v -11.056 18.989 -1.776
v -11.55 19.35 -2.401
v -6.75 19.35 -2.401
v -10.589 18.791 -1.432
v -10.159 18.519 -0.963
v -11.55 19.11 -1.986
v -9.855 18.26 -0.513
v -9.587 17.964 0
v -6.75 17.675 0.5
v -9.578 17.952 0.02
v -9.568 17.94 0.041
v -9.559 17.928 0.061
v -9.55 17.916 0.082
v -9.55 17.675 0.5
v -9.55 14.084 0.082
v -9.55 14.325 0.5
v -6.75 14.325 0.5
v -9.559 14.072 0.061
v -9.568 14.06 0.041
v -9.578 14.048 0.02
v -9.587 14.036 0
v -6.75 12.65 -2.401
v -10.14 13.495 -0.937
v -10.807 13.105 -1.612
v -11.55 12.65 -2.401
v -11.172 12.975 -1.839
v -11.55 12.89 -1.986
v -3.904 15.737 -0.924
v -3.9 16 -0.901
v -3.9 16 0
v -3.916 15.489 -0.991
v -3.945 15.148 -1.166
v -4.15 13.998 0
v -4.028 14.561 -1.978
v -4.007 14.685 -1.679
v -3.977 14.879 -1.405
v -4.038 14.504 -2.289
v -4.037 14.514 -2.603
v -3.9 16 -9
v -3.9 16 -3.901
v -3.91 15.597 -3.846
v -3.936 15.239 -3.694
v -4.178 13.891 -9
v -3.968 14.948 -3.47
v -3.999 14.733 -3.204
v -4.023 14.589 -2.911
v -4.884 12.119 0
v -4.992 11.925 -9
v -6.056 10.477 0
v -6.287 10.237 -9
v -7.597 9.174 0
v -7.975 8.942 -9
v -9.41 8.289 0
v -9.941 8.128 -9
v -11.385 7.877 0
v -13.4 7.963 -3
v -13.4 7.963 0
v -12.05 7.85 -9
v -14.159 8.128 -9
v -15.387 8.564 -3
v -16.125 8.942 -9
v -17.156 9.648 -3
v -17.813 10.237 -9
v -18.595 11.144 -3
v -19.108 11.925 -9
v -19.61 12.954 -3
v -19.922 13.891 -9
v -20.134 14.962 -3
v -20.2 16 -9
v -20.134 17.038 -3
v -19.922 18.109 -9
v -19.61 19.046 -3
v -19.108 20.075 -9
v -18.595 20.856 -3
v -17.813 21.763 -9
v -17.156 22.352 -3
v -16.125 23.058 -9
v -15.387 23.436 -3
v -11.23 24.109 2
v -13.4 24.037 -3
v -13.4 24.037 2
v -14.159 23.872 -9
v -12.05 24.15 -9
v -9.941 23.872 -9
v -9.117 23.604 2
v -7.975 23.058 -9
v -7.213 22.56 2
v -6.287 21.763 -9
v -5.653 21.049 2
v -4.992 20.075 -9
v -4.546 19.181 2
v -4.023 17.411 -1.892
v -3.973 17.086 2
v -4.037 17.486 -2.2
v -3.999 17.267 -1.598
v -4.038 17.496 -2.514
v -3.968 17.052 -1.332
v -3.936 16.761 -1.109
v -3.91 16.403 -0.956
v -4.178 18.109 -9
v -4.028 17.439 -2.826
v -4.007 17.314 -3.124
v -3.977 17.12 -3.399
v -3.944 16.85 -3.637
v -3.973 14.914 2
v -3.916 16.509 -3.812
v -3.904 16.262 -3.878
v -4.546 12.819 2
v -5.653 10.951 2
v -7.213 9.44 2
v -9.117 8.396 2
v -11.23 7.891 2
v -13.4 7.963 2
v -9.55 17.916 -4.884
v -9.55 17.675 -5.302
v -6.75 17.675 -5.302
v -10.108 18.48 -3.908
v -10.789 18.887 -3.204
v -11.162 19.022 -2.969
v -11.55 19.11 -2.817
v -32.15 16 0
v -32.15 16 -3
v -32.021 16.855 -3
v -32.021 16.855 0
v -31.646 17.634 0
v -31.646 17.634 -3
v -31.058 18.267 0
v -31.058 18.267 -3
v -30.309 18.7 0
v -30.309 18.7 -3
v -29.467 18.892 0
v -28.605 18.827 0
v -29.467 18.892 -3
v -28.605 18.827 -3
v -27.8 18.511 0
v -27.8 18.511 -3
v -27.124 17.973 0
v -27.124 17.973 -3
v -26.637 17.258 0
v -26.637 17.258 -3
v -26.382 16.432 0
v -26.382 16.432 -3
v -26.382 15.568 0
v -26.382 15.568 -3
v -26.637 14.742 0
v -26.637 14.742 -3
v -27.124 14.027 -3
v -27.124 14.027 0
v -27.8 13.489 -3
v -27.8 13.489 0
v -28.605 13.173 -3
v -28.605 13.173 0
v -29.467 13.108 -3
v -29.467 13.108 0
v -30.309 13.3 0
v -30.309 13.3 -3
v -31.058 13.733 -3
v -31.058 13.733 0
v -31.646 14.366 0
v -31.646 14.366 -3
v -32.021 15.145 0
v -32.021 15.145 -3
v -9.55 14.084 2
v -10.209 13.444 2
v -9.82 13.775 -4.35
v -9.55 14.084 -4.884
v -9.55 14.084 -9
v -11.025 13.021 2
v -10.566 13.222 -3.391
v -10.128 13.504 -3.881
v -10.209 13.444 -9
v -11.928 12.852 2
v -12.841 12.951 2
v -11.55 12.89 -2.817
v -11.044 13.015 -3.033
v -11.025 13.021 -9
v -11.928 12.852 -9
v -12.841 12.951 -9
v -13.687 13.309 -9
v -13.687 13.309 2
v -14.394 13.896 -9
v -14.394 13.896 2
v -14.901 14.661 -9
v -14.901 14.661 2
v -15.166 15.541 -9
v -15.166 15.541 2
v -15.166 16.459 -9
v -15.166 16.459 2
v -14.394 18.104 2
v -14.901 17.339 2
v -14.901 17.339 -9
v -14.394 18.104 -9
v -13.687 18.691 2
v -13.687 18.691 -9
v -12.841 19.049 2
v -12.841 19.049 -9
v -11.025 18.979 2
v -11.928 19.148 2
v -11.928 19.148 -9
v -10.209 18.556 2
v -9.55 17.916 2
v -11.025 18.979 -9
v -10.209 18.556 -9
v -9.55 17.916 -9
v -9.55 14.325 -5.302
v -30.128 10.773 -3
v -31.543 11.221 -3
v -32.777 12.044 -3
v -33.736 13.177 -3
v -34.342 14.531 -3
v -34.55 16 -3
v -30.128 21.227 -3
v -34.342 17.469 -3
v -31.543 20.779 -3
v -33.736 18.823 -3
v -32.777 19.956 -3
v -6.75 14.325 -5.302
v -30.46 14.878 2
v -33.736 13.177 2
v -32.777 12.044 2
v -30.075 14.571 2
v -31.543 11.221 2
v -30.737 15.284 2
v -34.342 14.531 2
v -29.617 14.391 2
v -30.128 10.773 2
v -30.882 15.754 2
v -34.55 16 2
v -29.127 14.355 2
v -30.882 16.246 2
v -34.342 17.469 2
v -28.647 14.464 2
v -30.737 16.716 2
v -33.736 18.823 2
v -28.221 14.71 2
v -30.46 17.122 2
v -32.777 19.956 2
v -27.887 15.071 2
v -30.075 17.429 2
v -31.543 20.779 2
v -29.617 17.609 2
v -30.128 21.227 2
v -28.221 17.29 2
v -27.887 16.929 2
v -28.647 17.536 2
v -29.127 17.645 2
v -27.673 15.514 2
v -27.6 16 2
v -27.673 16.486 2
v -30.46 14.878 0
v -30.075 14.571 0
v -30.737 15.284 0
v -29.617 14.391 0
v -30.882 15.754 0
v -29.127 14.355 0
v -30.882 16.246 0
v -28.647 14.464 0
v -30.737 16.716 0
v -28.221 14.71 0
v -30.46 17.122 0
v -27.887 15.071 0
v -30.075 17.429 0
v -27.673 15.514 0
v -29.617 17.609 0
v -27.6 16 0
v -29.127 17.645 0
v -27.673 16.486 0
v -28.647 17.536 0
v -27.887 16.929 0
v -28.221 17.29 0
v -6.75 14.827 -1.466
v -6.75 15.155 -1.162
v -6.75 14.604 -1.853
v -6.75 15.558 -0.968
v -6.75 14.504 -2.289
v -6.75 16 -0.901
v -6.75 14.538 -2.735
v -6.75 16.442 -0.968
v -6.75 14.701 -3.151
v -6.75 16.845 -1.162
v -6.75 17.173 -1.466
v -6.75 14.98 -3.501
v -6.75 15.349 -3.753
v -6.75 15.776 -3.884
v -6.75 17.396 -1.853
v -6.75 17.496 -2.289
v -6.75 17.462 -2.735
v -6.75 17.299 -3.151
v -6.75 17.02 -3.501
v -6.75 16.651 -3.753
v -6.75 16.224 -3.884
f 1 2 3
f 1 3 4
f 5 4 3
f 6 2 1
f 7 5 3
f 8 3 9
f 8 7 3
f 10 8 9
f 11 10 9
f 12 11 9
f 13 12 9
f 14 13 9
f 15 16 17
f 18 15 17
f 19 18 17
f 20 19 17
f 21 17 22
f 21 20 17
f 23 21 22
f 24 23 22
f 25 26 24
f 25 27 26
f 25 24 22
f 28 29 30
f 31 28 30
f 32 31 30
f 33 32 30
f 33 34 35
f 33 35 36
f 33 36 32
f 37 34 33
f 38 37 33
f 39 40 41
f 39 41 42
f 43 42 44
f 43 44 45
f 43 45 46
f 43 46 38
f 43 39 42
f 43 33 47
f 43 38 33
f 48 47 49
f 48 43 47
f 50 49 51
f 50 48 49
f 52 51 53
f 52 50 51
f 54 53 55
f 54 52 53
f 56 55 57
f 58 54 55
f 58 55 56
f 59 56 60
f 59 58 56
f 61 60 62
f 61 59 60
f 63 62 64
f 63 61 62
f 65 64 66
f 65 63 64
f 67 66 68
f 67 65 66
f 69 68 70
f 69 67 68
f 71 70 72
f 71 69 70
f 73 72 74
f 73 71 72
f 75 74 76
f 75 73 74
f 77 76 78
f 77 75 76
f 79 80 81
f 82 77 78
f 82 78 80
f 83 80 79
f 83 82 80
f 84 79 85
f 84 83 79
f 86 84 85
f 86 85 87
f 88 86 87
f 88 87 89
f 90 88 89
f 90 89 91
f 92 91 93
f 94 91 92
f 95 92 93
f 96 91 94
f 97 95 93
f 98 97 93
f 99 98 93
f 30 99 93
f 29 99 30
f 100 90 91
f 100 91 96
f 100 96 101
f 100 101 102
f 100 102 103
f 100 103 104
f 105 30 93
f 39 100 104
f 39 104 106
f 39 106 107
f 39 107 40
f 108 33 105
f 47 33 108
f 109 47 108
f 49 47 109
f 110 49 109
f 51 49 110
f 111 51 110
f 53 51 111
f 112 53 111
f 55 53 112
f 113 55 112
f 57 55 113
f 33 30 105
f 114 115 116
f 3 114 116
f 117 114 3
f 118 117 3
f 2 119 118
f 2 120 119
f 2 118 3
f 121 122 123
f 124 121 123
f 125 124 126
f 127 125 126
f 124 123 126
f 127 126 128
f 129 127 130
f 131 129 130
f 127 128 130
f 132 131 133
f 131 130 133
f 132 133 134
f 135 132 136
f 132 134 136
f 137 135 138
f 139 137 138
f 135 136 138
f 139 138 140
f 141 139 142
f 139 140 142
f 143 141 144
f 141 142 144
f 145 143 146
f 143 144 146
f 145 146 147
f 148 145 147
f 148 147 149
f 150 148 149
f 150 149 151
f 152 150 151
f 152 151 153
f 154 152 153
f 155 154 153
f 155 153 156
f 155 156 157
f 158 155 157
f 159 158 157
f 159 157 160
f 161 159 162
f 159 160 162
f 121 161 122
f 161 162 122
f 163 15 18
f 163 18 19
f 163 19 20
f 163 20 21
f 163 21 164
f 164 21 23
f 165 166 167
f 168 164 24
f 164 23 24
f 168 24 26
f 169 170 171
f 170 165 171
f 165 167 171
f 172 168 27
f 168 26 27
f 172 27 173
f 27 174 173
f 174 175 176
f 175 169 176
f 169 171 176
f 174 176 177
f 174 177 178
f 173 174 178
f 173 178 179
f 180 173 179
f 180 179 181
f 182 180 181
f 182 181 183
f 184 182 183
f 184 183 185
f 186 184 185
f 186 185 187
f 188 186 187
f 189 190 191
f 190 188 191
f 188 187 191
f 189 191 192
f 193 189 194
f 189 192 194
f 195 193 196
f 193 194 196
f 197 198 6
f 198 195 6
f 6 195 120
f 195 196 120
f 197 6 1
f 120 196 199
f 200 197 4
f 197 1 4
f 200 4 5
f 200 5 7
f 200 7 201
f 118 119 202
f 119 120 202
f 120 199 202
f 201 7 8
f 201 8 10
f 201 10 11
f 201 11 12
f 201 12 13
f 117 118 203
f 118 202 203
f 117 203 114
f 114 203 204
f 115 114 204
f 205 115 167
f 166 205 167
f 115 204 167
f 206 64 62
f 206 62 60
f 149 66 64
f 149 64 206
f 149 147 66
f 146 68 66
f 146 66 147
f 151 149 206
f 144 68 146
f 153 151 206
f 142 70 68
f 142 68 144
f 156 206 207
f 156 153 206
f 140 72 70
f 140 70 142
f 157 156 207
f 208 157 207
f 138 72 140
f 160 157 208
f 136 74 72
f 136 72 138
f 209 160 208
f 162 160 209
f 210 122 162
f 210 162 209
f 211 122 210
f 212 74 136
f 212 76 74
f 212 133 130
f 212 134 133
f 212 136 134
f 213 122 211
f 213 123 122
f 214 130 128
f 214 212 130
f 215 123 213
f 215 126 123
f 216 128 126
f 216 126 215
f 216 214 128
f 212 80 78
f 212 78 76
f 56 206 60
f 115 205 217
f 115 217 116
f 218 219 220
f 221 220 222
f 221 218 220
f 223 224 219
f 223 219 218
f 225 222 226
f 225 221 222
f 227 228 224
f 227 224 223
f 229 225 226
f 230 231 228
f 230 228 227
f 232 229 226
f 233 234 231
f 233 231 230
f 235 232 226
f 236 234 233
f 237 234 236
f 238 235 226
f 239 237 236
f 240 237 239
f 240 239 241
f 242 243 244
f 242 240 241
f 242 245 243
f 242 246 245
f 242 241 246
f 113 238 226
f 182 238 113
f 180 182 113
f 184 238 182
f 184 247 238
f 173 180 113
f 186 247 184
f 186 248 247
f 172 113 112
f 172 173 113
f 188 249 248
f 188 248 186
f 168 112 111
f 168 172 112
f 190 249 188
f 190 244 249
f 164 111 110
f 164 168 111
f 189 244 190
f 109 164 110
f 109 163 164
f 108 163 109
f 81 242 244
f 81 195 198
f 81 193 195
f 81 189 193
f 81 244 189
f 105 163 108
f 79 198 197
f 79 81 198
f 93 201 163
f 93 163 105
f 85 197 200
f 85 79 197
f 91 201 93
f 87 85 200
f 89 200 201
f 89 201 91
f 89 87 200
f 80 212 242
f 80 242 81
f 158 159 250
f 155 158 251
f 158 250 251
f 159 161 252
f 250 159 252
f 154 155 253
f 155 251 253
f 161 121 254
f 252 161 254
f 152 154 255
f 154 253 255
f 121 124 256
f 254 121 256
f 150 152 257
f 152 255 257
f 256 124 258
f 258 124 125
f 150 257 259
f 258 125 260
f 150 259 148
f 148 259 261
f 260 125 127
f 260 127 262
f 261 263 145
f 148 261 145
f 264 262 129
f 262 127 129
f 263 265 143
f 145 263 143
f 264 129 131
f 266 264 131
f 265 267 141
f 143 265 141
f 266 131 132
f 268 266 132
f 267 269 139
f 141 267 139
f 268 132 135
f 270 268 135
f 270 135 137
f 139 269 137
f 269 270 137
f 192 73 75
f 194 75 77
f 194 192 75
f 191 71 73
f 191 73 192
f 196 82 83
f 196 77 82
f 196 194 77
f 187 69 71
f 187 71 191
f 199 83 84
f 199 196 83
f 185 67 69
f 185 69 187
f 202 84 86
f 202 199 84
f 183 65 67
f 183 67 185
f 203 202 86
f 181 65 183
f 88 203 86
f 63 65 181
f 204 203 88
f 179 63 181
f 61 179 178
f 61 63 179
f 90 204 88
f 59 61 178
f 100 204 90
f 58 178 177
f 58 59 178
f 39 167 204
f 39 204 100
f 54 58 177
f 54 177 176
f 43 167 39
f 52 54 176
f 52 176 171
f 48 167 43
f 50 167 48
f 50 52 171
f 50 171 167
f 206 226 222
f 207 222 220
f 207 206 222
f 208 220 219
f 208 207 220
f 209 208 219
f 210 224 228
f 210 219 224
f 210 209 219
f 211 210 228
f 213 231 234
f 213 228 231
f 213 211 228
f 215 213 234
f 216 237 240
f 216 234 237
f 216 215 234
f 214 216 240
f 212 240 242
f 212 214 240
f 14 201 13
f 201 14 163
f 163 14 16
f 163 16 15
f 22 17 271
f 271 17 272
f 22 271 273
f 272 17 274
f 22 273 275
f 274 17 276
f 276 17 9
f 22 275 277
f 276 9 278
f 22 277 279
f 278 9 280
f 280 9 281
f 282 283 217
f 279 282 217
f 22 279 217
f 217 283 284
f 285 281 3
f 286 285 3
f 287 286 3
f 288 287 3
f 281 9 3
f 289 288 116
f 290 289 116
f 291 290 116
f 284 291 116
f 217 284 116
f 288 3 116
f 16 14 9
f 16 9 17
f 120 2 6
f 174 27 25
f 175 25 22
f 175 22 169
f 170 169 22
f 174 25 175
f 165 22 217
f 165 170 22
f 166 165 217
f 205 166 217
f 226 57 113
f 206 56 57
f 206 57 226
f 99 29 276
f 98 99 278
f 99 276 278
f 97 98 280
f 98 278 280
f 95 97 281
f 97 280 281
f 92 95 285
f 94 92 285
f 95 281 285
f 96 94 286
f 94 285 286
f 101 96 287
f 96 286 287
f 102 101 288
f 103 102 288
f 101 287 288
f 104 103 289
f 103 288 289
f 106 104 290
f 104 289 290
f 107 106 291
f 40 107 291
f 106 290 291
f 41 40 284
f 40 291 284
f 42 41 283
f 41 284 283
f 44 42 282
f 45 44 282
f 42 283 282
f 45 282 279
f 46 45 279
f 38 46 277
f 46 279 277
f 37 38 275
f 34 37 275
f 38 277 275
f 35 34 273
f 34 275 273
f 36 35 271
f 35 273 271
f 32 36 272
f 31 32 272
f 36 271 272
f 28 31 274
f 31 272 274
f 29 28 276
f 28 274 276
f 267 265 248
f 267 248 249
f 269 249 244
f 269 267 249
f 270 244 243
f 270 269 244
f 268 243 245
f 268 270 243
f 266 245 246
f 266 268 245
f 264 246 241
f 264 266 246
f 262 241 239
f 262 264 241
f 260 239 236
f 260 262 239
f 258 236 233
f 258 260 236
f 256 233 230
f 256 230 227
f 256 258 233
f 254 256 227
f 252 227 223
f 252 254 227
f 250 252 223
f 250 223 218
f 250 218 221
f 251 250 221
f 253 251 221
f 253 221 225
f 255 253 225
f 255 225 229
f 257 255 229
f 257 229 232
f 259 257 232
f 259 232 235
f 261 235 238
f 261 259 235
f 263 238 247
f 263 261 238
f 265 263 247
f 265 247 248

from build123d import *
from build123d.topology import SkipClean

# Parameters (mm, degrees)
SKETCH1_R               = 22.5
SKETCH1_R_2             = 3.15
SKETCH1_R_3             = 1.65
BOSS_EXTRUDE1_DEPTH     = 2
BOSS_EXTRUDE2_START     = 9
SKETCH2_R               = 8.15
SKETCH2_R_2             = 3.15
BOSS_EXTRUDE2_DEPTH     = 9
CUT_EXTRUDE1_DEPTH      = 53.886222213
CUT_EXTRUDE1_DEPTH_BACK = 53.886222213
SKETCH3_W               = 59.321790447
SKETCH3_H               = 68.701430229
BOSS_EXTRUDE4_START     = -11
BOSS_EXTRUDE4_DEPTH     = 11
CUT_EXTRUDE2_DEPTH      = 2.8
CUT_EXTRUDE2_DEPTH_BACK = 2
CUT_EXTRUDE2_START      = -9.55
SKETCH5_R               = 1.5
CUT_EXTRUDE3_DEPTH      = 35.543052847
BOSS_EXTRUDE3_START     = 3
SKETCH6_R               = 2.9
BOSS_EXTRUDE3_DEPTH     = 3


# Read off the part's stored shape, not the designer's step: Boss-Extrude4
with BuildPart() as part:
    # Sketch1 → Boss-Extrude1 (new body)
    with BuildSketch(Plane.XY):
        with Locations((-12.05, 16)):
            Circle(SKETCH1_R)
        with Locations((-12.05, 16)):
            Circle(SKETCH1_R_2, mode=Mode.SUBTRACT)
        with Locations((-29.25, 16)):
            Circle(SKETCH1_R_3, mode=Mode.SUBTRACT)
        with Locations((5.15, 16)):
            Circle(SKETCH1_R_3, mode=Mode.SUBTRACT)
    extrude(amount=BOSS_EXTRUDE1_DEPTH)

    # Sketch2 → Boss-Extrude2 (add)
    with SkipClean():  # the faces are left unmerged after this step: merging them gives an invalid solid
        with BuildSketch(Plane(origin=(0, 0, 0), x_dir=(-1, 0, 0), z_dir=(0, 0, -1)).offset(BOSS_EXTRUDE2_START)):
            with Locations(Location((12.05, 16, 0), (0, 0, 180))):
                Circle(SKETCH2_R)
            with Locations((12.05, 16)):
                Circle(SKETCH2_R_2, mode=Mode.SUBTRACT)
        extrude(amount=-BOSS_EXTRUDE2_DEPTH)

    # Sketch3 → Cut-Extrude1 (cut, two sides: drawn at the far end of the back side and taken through both)
    with BuildSketch(Plane.XY.offset(2).offset(-CUT_EXTRUDE1_DEPTH_BACK)):
        with Locations((-10.056838751, 16.22852839)):
            Rectangle(SKETCH3_W, SKETCH3_H)
        with BuildLine():
            Line((-30.128197674, 10.773264035), (-13.400436047, 7.962660734))
            ThreePointArc((-13.400436047, 7.962660734), (-3.9, 16), (-13.400436047, 24.037339266))
            Line((-13.400436047, 24.037339266), (-30.128197674, 21.226735965))
            ThreePointArc((-30.128197674, 21.226735965), (-34.55, 16), (-30.128197674, 10.773264035))
        make_face(mode=Mode.SUBTRACT)
    extrude(amount=CUT_EXTRUDE1_DEPTH + CUT_EXTRUDE1_DEPTH_BACK, mode=Mode.SUBTRACT)

    # Boss-Extrude4 outline → Boss-Extrude4 (add)
    with BuildSketch(Plane.XY.offset(2).offset(BOSS_EXTRUDE4_START)):
        with BuildLine():
            ThreePointArc((-9.55, 14.08362321), (-8.9, 16), (-9.55, 17.91637679))
            Line((-9.55, 17.91637679), (-9.55, 14.08362321))
        make_face()
    extrude(amount=BOSS_EXTRUDE4_DEPTH)

    # Sketch4 → Cut-Extrude2 (cut, two sides: drawn at the far end of the back side and taken through both)
    with BuildSketch(Plane(origin=(0, 0, 0), x_dir=(0, 0, -1), z_dir=(1, 0, 0)).offset(CUT_EXTRUDE2_START - CUT_EXTRUDE2_DEPTH_BACK)):
        Polygon((-0.5, 17.675), (-0.5, 14.325), (2.401185103, 12.65), (5.302370205, 14.325), (5.302370205, 17.675), (2.401185103, 19.35), align=None)
    extrude(amount=CUT_EXTRUDE2_DEPTH + CUT_EXTRUDE2_DEPTH_BACK, mode=Mode.SUBTRACT)

    # Sketch5 → Cut-Extrude3 (cut, through all)
    with BuildSketch(Plane.ZY.offset(11.55)):
        with Locations((-2.401185103, 16)):
            Circle(SKETCH5_R)
    extrude(amount=-CUT_EXTRUDE3_DEPTH, mode=Mode.SUBTRACT)

    # Sketch6 → Boss-Extrude3 (add)
    with BuildSketch(Plane(origin=(0, 0, 0), x_dir=(-1, 0, 0), z_dir=(0, 0, -1)).offset(BOSS_EXTRUDE3_START)):
        with BuildLine():
            Line((30.128197674, 21.226735965), (13.400436047, 24.037339266))
            ThreePointArc((13.400436047, 24.037339266), (20.2, 16), (13.400436047, 7.962660734))
            Line((13.400436047, 7.962660734), (30.128197674, 10.773264035))
            ThreePointArc((30.128197674, 10.773264035), (34.55, 16), (30.128197674, 21.226735965))
        make_face()
        with Locations((29.25, 16)):
            Circle(SKETCH6_R, mode=Mode.SUBTRACT)
    extrude(amount=-BOSS_EXTRUDE3_DEPTH)


solid = part.part
